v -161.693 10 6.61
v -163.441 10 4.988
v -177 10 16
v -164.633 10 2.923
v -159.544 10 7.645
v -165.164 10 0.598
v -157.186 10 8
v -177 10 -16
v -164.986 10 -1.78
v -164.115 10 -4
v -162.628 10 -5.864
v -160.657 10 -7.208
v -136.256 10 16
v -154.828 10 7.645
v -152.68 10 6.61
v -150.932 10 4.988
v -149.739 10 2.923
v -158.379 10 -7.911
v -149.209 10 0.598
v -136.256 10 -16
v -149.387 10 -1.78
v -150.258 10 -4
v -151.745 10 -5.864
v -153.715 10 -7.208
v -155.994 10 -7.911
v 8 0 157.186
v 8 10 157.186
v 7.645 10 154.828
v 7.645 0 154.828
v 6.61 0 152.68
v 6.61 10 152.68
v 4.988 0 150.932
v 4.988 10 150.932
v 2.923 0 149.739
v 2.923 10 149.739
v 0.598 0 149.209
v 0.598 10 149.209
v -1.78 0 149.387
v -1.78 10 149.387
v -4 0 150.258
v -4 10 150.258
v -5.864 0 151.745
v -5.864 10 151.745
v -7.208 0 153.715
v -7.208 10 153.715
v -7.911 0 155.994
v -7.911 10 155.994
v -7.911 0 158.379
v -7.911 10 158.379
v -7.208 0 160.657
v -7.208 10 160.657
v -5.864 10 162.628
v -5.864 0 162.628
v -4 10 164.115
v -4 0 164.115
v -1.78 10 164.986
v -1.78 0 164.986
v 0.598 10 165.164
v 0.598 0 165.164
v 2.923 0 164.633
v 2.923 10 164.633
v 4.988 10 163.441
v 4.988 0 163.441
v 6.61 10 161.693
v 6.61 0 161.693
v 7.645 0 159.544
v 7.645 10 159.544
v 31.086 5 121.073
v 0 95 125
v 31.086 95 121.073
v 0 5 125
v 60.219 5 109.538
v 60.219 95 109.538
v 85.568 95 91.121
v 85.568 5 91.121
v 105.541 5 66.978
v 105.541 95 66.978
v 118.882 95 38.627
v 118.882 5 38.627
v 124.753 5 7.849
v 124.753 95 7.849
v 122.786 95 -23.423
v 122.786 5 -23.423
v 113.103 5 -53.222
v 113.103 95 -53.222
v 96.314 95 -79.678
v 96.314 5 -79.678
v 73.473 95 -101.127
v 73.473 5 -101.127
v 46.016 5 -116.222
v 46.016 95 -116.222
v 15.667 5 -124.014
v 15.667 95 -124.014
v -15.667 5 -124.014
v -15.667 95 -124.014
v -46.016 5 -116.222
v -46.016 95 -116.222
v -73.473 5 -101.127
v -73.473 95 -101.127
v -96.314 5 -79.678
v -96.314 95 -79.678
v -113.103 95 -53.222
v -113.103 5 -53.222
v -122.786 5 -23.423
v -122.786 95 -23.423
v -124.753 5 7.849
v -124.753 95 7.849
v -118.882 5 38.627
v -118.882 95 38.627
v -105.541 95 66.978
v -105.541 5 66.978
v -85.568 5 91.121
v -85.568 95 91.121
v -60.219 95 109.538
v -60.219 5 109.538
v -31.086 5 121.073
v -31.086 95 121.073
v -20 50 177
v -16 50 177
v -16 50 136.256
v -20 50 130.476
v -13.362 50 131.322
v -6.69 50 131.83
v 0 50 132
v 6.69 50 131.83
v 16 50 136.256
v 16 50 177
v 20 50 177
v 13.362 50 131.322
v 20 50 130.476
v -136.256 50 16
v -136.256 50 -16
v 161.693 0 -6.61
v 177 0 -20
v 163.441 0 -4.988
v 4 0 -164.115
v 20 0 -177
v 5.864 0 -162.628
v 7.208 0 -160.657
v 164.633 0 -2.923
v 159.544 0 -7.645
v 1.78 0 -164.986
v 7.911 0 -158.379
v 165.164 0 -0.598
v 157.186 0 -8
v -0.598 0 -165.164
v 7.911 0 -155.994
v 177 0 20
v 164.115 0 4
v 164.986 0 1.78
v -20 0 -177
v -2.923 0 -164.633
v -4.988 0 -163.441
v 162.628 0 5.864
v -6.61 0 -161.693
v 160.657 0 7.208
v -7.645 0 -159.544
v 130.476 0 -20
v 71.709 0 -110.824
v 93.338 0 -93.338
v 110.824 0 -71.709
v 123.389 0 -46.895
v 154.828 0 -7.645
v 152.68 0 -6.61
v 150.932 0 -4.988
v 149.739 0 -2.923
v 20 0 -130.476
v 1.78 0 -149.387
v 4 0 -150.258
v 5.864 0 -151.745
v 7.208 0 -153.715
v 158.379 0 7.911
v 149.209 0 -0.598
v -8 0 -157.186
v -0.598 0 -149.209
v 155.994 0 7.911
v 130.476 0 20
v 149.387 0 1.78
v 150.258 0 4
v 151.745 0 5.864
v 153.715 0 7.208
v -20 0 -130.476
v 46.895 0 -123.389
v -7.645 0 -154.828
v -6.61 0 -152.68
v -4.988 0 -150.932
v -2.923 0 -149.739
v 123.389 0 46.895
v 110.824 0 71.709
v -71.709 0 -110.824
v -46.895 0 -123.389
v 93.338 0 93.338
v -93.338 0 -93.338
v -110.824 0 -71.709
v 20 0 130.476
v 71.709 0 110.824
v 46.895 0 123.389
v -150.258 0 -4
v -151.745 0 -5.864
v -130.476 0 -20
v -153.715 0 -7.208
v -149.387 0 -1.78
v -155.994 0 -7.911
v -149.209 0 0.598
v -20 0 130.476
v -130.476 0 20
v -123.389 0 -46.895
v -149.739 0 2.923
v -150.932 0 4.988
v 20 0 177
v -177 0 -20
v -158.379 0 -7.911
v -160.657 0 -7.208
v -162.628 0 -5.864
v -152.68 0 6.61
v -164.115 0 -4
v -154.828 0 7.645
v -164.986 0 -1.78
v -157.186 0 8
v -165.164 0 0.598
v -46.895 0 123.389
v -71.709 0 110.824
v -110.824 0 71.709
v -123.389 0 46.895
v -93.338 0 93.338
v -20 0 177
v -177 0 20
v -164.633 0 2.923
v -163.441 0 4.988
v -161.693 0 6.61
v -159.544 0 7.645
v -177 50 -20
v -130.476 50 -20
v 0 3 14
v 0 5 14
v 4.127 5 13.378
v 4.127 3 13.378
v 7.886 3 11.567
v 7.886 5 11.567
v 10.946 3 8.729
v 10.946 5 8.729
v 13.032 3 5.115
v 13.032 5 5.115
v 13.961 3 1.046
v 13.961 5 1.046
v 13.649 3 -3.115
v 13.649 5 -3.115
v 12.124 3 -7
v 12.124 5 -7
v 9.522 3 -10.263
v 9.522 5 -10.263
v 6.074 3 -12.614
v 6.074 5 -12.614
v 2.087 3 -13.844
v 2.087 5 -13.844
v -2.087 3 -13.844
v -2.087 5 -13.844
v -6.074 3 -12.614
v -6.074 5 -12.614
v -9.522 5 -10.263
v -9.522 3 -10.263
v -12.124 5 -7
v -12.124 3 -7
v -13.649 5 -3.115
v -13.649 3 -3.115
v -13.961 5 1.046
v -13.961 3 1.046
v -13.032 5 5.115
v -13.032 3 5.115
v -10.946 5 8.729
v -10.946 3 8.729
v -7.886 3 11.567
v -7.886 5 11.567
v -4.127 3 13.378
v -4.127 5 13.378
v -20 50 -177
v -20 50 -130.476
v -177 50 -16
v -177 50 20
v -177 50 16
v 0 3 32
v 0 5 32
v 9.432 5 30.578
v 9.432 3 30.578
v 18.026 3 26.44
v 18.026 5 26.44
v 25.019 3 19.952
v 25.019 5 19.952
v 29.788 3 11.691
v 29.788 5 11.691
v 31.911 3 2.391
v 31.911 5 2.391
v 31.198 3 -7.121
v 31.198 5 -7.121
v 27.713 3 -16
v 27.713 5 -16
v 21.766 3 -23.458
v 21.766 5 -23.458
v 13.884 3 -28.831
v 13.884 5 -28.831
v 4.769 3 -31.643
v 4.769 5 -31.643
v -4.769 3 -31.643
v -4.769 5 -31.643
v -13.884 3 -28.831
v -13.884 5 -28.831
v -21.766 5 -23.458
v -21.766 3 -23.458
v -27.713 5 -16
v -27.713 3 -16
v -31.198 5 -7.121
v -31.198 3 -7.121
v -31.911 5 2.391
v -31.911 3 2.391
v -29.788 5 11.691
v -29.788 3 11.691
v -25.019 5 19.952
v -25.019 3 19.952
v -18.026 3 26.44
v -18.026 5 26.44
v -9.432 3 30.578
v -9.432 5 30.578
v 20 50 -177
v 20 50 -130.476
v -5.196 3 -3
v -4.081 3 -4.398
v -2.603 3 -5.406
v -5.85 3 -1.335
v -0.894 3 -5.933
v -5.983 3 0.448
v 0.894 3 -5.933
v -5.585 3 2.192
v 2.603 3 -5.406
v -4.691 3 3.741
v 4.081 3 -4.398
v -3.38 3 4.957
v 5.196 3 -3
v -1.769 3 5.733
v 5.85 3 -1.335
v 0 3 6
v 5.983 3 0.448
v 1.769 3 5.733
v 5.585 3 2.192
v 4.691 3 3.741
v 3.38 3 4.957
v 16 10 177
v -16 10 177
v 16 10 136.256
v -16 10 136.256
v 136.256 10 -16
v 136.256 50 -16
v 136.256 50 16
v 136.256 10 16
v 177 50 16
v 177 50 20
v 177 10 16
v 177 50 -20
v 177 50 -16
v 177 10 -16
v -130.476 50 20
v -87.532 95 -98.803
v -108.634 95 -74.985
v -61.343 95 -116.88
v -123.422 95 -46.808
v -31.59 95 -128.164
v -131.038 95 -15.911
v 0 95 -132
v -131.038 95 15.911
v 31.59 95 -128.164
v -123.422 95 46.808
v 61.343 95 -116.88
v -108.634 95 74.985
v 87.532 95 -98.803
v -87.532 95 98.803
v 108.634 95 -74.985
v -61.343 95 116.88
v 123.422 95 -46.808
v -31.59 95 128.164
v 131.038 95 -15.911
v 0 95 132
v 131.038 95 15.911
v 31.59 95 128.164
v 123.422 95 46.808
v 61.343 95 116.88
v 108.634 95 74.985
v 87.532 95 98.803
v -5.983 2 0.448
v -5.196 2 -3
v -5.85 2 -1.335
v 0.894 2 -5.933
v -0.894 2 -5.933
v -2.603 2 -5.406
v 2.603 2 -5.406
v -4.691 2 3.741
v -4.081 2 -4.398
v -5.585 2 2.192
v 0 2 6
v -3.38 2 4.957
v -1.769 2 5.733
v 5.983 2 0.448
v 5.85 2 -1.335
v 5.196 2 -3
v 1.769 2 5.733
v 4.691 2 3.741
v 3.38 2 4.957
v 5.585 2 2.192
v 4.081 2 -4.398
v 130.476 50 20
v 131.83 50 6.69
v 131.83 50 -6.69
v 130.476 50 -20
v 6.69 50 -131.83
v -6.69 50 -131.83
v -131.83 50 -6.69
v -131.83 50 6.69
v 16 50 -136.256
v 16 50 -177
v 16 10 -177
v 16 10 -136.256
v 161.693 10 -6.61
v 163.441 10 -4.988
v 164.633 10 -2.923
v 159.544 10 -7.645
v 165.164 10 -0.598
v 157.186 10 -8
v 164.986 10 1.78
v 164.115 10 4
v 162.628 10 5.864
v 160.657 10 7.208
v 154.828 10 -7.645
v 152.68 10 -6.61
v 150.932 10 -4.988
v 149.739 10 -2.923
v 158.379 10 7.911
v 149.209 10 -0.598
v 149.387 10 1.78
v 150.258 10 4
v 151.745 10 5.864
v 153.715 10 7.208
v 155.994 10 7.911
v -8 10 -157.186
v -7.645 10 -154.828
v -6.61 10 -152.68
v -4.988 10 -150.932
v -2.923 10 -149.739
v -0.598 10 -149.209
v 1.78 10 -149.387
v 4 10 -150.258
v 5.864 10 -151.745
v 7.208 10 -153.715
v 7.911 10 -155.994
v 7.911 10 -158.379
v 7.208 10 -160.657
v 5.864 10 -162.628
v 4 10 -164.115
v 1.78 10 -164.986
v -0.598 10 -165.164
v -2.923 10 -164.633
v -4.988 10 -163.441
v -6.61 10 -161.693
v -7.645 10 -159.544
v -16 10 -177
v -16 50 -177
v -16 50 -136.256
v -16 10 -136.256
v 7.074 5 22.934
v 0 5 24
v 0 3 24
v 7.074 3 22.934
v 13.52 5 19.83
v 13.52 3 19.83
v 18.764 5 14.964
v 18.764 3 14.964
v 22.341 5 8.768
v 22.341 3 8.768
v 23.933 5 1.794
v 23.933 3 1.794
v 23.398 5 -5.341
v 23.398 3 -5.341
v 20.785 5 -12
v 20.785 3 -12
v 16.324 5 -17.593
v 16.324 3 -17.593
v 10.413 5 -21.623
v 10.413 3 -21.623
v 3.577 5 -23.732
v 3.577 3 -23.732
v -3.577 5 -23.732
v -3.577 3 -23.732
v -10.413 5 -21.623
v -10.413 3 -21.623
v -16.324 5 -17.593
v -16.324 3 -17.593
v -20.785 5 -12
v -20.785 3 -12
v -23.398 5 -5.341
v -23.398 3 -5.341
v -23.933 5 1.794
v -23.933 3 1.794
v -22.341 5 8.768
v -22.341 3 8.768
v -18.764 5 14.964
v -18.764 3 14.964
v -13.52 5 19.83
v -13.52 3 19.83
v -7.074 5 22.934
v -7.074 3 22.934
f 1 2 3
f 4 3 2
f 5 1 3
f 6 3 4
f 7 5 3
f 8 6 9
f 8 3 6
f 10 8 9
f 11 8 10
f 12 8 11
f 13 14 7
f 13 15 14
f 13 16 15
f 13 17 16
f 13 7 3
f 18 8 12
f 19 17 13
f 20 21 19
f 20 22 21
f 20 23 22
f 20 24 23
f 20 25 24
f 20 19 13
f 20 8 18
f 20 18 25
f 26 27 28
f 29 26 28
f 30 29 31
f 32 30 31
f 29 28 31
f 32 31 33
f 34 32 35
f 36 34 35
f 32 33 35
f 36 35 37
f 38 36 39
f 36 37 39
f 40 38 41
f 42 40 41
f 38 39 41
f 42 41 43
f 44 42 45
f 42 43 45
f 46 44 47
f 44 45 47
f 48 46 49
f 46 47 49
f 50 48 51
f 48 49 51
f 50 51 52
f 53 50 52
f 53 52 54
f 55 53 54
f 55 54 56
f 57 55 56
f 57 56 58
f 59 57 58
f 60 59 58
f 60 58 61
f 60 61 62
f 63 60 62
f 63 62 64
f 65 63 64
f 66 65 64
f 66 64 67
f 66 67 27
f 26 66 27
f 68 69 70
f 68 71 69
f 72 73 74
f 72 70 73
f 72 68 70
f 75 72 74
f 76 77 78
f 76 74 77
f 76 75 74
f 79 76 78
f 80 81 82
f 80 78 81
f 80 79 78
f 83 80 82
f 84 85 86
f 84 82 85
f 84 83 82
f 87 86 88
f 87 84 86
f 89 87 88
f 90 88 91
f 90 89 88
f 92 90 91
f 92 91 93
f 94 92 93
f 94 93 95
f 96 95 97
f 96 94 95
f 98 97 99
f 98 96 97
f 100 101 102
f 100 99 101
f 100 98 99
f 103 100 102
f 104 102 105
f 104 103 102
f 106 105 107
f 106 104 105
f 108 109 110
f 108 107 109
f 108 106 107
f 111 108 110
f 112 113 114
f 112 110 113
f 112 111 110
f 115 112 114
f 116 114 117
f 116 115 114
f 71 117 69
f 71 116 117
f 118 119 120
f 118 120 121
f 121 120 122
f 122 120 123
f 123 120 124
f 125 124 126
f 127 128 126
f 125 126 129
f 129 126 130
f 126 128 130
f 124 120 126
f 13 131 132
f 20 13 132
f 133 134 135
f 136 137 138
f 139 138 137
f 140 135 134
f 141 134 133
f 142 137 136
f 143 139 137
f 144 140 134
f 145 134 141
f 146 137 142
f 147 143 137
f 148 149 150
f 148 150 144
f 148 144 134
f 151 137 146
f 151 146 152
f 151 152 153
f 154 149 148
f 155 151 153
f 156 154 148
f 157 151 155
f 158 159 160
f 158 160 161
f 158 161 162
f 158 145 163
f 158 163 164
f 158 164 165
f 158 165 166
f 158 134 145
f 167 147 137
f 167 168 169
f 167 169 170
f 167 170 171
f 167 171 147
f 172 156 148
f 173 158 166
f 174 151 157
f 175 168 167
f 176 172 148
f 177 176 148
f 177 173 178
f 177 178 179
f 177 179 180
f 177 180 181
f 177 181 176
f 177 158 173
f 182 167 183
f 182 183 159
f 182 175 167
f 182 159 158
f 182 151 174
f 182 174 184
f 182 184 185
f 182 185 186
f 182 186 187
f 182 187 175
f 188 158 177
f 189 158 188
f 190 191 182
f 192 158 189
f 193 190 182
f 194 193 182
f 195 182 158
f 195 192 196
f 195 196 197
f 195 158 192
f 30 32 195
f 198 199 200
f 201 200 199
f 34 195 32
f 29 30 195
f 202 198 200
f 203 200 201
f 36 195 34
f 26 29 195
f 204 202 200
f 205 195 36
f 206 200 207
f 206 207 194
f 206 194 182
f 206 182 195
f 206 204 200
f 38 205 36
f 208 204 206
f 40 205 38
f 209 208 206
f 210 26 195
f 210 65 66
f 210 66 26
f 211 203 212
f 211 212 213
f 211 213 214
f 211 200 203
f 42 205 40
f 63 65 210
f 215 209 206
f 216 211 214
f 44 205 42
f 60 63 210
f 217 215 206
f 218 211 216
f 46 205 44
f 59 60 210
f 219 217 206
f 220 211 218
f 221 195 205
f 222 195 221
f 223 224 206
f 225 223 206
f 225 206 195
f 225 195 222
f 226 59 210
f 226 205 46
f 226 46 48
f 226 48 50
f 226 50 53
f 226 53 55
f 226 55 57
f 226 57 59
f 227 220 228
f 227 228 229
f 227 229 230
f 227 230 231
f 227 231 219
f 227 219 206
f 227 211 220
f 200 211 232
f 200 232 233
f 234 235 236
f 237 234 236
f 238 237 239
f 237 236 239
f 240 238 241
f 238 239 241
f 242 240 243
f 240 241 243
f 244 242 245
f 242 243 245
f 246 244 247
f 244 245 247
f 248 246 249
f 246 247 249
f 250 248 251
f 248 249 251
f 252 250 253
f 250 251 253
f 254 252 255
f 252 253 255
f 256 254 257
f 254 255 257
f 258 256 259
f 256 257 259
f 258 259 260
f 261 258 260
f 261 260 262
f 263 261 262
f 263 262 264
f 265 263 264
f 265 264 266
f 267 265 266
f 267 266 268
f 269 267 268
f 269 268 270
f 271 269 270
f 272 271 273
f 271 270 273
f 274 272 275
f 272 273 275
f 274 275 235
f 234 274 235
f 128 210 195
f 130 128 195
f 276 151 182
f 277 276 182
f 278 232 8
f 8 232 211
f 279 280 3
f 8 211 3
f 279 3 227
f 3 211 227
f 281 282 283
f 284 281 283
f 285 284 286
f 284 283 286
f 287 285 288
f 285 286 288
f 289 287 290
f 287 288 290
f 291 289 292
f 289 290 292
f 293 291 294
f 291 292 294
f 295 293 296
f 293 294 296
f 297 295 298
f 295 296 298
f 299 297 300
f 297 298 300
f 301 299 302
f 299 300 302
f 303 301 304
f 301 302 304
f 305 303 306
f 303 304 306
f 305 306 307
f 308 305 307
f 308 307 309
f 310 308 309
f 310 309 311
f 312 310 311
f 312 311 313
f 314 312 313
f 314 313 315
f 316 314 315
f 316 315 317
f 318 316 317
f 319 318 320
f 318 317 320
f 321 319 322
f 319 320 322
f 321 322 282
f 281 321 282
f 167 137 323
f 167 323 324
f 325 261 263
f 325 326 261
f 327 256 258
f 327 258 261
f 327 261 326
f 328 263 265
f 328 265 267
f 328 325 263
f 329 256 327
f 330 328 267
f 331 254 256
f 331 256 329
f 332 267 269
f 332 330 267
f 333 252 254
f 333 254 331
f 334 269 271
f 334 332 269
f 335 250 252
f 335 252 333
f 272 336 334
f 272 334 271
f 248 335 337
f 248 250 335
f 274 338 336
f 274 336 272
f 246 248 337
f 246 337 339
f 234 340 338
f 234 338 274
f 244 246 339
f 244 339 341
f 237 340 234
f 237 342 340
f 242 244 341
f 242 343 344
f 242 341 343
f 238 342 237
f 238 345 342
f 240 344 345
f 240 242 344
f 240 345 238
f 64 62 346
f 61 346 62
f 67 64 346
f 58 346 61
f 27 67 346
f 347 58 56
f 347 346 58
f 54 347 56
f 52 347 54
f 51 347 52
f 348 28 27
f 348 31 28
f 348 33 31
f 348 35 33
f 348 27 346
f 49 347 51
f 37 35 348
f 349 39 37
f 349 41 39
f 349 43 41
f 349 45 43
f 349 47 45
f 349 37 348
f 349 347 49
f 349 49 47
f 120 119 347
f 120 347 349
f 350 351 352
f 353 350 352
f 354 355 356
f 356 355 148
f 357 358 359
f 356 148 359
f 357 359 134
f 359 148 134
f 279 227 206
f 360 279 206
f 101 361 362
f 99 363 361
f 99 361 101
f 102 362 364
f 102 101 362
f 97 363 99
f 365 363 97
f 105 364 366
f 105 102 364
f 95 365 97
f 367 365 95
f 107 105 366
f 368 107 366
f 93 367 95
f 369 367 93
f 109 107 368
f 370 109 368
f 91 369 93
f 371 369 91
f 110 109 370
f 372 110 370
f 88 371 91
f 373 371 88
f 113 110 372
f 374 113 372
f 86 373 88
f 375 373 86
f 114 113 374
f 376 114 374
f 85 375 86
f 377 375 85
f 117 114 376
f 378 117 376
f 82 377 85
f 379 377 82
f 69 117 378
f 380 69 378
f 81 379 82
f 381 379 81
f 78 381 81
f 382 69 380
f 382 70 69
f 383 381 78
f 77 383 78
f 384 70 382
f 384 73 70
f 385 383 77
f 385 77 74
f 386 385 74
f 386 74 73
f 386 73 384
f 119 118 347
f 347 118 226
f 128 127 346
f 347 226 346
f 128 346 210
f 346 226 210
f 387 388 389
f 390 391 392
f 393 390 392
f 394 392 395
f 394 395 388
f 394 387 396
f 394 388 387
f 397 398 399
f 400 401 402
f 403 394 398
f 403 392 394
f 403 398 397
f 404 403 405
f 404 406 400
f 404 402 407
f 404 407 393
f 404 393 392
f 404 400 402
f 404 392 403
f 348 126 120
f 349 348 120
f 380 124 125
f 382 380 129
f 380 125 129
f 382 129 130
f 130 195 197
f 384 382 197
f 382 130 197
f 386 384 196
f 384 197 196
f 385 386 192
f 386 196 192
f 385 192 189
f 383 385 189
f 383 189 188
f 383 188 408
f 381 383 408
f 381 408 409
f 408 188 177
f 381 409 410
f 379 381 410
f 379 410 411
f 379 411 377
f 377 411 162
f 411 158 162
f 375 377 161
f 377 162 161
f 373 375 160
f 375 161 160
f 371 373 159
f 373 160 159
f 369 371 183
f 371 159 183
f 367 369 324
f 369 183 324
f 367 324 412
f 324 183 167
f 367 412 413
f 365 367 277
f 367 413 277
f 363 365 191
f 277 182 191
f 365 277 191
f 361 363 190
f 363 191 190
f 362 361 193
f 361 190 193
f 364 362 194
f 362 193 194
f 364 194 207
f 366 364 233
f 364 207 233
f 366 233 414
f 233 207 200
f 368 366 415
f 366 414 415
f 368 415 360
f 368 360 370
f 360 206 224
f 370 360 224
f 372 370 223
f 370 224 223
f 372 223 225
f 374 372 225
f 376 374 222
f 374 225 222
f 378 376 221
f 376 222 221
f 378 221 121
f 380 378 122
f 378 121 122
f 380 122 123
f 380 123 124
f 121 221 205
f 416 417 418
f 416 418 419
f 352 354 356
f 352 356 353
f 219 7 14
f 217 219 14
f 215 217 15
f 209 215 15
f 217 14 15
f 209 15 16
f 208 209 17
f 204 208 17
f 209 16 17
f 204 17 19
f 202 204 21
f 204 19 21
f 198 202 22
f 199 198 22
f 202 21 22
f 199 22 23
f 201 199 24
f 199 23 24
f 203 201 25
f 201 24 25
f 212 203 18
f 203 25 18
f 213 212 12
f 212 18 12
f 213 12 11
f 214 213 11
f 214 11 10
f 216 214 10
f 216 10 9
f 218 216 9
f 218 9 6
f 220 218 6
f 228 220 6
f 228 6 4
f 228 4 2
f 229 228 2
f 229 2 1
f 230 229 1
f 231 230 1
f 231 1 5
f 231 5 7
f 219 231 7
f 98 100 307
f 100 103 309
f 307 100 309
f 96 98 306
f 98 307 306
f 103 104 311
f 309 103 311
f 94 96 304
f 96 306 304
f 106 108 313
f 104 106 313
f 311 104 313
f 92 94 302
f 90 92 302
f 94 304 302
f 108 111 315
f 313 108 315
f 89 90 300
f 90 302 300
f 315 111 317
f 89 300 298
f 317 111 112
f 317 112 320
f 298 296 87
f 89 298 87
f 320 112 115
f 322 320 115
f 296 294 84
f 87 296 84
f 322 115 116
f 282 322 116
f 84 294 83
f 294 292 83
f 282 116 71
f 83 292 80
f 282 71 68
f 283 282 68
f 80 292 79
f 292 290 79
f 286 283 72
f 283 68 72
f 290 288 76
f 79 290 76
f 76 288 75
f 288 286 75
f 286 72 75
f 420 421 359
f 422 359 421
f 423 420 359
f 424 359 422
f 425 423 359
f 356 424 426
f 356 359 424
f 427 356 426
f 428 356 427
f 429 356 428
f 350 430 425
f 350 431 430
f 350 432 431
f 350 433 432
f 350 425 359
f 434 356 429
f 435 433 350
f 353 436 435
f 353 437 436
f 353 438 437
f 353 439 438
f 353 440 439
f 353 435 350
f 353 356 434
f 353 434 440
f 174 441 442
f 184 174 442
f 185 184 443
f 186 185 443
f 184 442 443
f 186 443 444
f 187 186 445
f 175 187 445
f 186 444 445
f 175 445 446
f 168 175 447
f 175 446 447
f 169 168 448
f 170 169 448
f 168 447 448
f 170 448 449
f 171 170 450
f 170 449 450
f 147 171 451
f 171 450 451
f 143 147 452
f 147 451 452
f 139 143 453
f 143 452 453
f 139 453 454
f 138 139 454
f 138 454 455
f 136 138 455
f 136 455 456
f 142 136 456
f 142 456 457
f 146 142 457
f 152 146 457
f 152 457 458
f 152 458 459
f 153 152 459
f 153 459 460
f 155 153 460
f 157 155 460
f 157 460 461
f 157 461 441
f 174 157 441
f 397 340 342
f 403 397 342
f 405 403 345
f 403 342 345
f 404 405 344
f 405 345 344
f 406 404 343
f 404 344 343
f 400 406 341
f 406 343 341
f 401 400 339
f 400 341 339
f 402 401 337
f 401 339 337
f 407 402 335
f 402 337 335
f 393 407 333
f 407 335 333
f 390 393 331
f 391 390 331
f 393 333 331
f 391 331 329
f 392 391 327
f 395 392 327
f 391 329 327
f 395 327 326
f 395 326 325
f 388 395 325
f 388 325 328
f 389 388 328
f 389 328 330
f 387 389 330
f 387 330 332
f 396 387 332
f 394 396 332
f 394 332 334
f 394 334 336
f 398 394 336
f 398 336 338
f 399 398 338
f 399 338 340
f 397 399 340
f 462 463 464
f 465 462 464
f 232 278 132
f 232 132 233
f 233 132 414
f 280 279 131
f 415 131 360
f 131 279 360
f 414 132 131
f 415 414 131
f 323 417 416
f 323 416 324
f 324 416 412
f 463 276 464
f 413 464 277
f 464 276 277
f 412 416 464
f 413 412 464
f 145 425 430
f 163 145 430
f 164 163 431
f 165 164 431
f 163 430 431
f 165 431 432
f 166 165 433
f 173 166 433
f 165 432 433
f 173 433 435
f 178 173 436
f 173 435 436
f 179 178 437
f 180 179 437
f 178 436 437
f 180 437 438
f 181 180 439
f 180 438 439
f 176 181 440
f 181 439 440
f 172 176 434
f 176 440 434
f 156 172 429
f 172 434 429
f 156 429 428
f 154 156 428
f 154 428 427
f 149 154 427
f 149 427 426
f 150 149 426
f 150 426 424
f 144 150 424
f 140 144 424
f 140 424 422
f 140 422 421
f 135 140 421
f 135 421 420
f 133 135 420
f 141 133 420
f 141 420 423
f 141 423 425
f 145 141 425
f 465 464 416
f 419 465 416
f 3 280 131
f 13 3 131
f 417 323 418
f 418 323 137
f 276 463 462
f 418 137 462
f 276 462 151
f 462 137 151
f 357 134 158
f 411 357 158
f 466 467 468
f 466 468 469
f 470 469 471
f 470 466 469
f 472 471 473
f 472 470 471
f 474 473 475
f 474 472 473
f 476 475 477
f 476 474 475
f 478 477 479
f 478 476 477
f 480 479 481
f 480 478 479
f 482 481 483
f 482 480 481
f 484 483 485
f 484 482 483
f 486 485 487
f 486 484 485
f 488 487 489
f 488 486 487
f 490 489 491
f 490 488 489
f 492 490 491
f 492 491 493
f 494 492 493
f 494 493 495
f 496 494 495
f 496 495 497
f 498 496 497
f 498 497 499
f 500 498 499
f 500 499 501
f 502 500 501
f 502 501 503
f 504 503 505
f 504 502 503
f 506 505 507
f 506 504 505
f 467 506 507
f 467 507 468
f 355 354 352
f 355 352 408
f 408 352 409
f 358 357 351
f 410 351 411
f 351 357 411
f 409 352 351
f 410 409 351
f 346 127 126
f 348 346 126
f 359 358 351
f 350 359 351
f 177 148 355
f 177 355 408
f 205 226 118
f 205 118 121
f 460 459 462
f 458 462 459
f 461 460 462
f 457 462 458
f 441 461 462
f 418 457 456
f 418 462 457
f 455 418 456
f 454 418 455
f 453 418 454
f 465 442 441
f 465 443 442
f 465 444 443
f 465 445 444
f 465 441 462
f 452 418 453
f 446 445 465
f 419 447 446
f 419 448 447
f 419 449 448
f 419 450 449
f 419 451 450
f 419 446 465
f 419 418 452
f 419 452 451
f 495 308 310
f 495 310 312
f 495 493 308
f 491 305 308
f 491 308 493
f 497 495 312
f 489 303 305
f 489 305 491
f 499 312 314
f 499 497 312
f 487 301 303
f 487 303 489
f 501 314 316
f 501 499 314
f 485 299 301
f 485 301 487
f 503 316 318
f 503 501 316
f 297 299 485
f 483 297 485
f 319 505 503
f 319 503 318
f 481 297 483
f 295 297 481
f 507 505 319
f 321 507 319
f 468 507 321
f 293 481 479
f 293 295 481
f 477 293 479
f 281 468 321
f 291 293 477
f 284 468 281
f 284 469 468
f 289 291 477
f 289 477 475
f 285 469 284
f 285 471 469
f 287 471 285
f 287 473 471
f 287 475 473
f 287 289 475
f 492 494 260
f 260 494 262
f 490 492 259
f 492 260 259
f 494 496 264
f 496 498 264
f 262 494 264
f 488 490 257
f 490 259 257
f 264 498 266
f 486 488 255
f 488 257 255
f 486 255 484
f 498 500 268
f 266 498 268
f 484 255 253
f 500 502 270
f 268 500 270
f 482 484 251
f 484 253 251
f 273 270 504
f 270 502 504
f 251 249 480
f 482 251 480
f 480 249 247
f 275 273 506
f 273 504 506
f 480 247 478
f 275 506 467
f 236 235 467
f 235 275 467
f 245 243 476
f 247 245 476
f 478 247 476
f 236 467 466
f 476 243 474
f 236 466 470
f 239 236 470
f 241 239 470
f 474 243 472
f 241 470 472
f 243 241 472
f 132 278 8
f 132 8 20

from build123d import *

# Parameters (mm, degrees)
SKETCH1_R           = 132
BOSS_EXTRUDE1_DEPTH = 5
SKETCH2_R           = 132
SKETCH2_R_2         = 125
BOSS_EXTRUDE2_DEPTH = 90
SKETCH3_W           = 49.925821921
SKETCH3_H           = 40
BOSS_EXTRUDE4_DEPTH = 50
SKETCH4_W           = 40.744064535
SKETCH4_H           = 32
CUT_EXTRUDE1_DEPTH  = 40
SKETCH5_R           = 8
CUT_EXTRUDE2_DEPTH  = 40
CIRPATTERN2_COUNT   = 4
SKETCH7_R           = 32
SKETCH7_R_2         = 28
CUT_EXTRUDE3_DEPTH  = 2
SKETCH8_R           = 6
CUT_EXTRUDE4_DEPTH  = 3
BOSS_EXTRUDE5_START = -5
SKETCH9_R           = 32
BOSS_EXTRUDE5_DEPTH = 5
SKETCH10_R          = 32
SKETCH10_R_2        = 24
CUT_EXTRUDE5_DEPTH  = 2
SKETCH11_R          = 14
SKETCH11_R_2        = 6
CUT_EXTRUDE6_DEPTH  = 2
SKETCH12_R          = 6
CUT_EXTRUDE7_DEPTH  = 3


with BuildPart() as part:
    # Sketch1 → Boss-Extrude1 (new body)
    with BuildSketch(Plane(origin=(0, 0, 0), x_dir=(1, 0, 0), z_dir=(0, 1, 0))):
        with Locations(Location((0, 0, 0), (0, 0, 270))):
            Circle(SKETCH1_R)
    extrude(amount=BOSS_EXTRUDE1_DEPTH)

    # Sketch2 → Boss-Extrude2 (add)
    with BuildSketch(Plane(origin=(0, 5, 0), x_dir=(1, 0, 0), z_dir=(0, 1, 0))):
        with Locations(Location((0, 0, 0), (0, 0, 270))):
            Circle(SKETCH2_R)
        with Locations(Location((0, 0, 0), (0, 0, 270))):
            Circle(SKETCH2_R_2, mode=Mode.SUBTRACT)
    extrude(amount=BOSS_EXTRUDE2_DEPTH)

    # Sketch3 → Boss-Extrude4 (add)
    with BuildSketch(Plane.XZ):
        with Locations((-152.03708904, 0)):
            Rectangle(SKETCH3_W, SKETCH3_H)
    extrude(amount=-BOSS_EXTRUDE4_DEPTH)

    # Sketch4 → Cut-Extrude1 (cut)
    with BuildSketch(Plane(origin=(0, 50, 0), x_dir=(1, 0, 0), z_dir=(0, 1, 0))):
        with Locations((-156.627967732, 0)):
            Rectangle(SKETCH4_W, SKETCH4_H)
    extrude(amount=-CUT_EXTRUDE1_DEPTH, mode=Mode.SUBTRACT)

    # Sketch5 → Cut-Extrude2 (cut)
    with BuildSketch(Plane(origin=(0, 10, 0), x_dir=(1, 0, 0), z_dir=(0, 1, 0))):
        with Locations(Location((-157.186334462, 0, 0), (0, 0, 270))):
            Circle(SKETCH5_R)
    extrude(amount=-CUT_EXTRUDE2_DEPTH, mode=Mode.SUBTRACT)


with BuildPart() as cirpattern2_1:
    # CirPattern2: pattern copy
    add(part.part.rotate(Axis((0, 0, 0), (0, 1, 0)), 1 * 360 / CIRPATTERN2_COUNT))


with BuildPart() as cirpattern2_2:
    # CirPattern2: pattern copy
    add(part.part.rotate(Axis((0, 0, 0), (0, 1, 0)), 2 * 360 / CIRPATTERN2_COUNT))


with BuildPart() as cirpattern2_3:
    # CirPattern2: pattern copy
    add(part.part.rotate(Axis((0, 0, 0), (0, 1, 0)), 3 * 360 / CIRPATTERN2_COUNT))


with BuildPart() as cut_extrude3_tool:
    # Sketch7 → Cut-Extrude3 (new body)
    with BuildSketch(Plane(origin=(0, 5, 0), x_dir=(1, 0, 0), z_dir=(0, 1, 0))):
        with Locations(Location((0, 0, 0), (0, 0, 270))):
            Circle(SKETCH7_R)
        with Locations(Location((0, 0, 0), (0, 0, 270))):
            Circle(SKETCH7_R_2, mode=Mode.SUBTRACT)
    extrude(amount=-CUT_EXTRUDE3_DEPTH)


with BuildPart() as part_1:
    add(part.part)

    # Cut-Extrude3: cut by cut_extrude3_tool
    add(cut_extrude3_tool.part, mode=Mode.SUBTRACT)


with BuildPart() as cirpattern2_1_1:
    add(cirpattern2_1.part)

    # Cut-Extrude3: cut by cut_extrude3_tool
    add(cut_extrude3_tool.part, mode=Mode.SUBTRACT)


with BuildPart() as cirpattern2_2_1:
    add(cirpattern2_2.part)

    # Cut-Extrude3: cut by cut_extrude3_tool
    add(cut_extrude3_tool.part, mode=Mode.SUBTRACT)


with BuildPart() as cirpattern2_3_1:
    add(cirpattern2_3.part)

    # Cut-Extrude3: cut by cut_extrude3_tool
    add(cut_extrude3_tool.part, mode=Mode.SUBTRACT)


with BuildPart() as cut_extrude4_tool:
    # Sketch8 → Cut-Extrude4 (new body)
    with BuildSketch(Plane(origin=(0, 5, 0), x_dir=(1, 0, 0), z_dir=(0, 1, 0))):
        with Locations(Location((0, 0, 0), (0, 0, 270))):
            Circle(SKETCH8_R)
    extrude(amount=-CUT_EXTRUDE4_DEPTH)


with BuildPart() as part_2:
    add(part_1.part)

    # Cut-Extrude4: cut by cut_extrude4_tool
    add(cut_extrude4_tool.part, mode=Mode.SUBTRACT)



with BuildPart() as cirpattern2_1_2:
    add(cirpattern2_1_1.part)

    # Cut-Extrude4: cut by cut_extrude4_tool
    add(cut_extrude4_tool.part, mode=Mode.SUBTRACT)


with BuildPart() as cirpattern2_2_2:
    add(cirpattern2_2_1.part)

    # Cut-Extrude4: cut by cut_extrude4_tool
    add(cut_extrude4_tool.part, mode=Mode.SUBTRACT)


with BuildPart() as cirpattern2_3_2:
    add(cirpattern2_3_1.part)

    # Cut-Extrude4: cut by cut_extrude4_tool
    add(cut_extrude4_tool.part, mode=Mode.SUBTRACT)


with BuildPart() as part_3:
    add(part_2.part)

    add(cirpattern2_1_2.part)  # Boss-Extrude5 merges CirPattern2_1

    add(cirpattern2_2_2.part)  # Boss-Extrude5 merges CirPattern2_2

    add(cirpattern2_3_2.part)  # Boss-Extrude5 merges CirPattern2_3
    # Sketch9 → Boss-Extrude5 (add)
    with BuildSketch(Plane.XZ.offset(BOSS_EXTRUDE5_START)):
        Circle(SKETCH9_R)
    extrude(amount=BOSS_EXTRUDE5_DEPTH)

    # Sketch10 → Cut-Extrude5 (cut)
    with BuildSketch(Plane(origin=(0, 5, 0), x_dir=(1, 0, 0), z_dir=(0, 1, 0))):
        with Locations(Location((0, 0, 0), (0, 0, 270))):
            Circle(SKETCH10_R)
        with Locations(Location((0, 0, 0), (0, 0, 270))):
            Circle(SKETCH10_R_2, mode=Mode.SUBTRACT)
    extrude(amount=-CUT_EXTRUDE5_DEPTH, mode=Mode.SUBTRACT)

    # Sketch11 → Cut-Extrude6 (cut)
    with BuildSketch(Plane(origin=(0, 5, 0), x_dir=(1, 0, 0), z_dir=(0, 1, 0))):
        with Locations(Location((0, 0, 0), (0, 0, 270))):
            Circle(SKETCH11_R)
        with Locations(Location((0, 0, 0), (0, 0, 270))):
            Circle(SKETCH11_R_2, mode=Mode.SUBTRACT)
    extrude(amount=-CUT_EXTRUDE6_DEPTH, mode=Mode.SUBTRACT)

    # Sketch12 → Cut-Extrude7 (cut)
    with BuildSketch(Plane(origin=(0, 5, 0), x_dir=(1, 0, 0), z_dir=(0, 1, 0))):
        with Locations(Location((0, 0, 0), (0, 0, 270))):
            Circle(SKETCH12_R)
    extrude(amount=-CUT_EXTRUDE7_DEPTH, mode=Mode.SUBTRACT)


solid = part_3.part
